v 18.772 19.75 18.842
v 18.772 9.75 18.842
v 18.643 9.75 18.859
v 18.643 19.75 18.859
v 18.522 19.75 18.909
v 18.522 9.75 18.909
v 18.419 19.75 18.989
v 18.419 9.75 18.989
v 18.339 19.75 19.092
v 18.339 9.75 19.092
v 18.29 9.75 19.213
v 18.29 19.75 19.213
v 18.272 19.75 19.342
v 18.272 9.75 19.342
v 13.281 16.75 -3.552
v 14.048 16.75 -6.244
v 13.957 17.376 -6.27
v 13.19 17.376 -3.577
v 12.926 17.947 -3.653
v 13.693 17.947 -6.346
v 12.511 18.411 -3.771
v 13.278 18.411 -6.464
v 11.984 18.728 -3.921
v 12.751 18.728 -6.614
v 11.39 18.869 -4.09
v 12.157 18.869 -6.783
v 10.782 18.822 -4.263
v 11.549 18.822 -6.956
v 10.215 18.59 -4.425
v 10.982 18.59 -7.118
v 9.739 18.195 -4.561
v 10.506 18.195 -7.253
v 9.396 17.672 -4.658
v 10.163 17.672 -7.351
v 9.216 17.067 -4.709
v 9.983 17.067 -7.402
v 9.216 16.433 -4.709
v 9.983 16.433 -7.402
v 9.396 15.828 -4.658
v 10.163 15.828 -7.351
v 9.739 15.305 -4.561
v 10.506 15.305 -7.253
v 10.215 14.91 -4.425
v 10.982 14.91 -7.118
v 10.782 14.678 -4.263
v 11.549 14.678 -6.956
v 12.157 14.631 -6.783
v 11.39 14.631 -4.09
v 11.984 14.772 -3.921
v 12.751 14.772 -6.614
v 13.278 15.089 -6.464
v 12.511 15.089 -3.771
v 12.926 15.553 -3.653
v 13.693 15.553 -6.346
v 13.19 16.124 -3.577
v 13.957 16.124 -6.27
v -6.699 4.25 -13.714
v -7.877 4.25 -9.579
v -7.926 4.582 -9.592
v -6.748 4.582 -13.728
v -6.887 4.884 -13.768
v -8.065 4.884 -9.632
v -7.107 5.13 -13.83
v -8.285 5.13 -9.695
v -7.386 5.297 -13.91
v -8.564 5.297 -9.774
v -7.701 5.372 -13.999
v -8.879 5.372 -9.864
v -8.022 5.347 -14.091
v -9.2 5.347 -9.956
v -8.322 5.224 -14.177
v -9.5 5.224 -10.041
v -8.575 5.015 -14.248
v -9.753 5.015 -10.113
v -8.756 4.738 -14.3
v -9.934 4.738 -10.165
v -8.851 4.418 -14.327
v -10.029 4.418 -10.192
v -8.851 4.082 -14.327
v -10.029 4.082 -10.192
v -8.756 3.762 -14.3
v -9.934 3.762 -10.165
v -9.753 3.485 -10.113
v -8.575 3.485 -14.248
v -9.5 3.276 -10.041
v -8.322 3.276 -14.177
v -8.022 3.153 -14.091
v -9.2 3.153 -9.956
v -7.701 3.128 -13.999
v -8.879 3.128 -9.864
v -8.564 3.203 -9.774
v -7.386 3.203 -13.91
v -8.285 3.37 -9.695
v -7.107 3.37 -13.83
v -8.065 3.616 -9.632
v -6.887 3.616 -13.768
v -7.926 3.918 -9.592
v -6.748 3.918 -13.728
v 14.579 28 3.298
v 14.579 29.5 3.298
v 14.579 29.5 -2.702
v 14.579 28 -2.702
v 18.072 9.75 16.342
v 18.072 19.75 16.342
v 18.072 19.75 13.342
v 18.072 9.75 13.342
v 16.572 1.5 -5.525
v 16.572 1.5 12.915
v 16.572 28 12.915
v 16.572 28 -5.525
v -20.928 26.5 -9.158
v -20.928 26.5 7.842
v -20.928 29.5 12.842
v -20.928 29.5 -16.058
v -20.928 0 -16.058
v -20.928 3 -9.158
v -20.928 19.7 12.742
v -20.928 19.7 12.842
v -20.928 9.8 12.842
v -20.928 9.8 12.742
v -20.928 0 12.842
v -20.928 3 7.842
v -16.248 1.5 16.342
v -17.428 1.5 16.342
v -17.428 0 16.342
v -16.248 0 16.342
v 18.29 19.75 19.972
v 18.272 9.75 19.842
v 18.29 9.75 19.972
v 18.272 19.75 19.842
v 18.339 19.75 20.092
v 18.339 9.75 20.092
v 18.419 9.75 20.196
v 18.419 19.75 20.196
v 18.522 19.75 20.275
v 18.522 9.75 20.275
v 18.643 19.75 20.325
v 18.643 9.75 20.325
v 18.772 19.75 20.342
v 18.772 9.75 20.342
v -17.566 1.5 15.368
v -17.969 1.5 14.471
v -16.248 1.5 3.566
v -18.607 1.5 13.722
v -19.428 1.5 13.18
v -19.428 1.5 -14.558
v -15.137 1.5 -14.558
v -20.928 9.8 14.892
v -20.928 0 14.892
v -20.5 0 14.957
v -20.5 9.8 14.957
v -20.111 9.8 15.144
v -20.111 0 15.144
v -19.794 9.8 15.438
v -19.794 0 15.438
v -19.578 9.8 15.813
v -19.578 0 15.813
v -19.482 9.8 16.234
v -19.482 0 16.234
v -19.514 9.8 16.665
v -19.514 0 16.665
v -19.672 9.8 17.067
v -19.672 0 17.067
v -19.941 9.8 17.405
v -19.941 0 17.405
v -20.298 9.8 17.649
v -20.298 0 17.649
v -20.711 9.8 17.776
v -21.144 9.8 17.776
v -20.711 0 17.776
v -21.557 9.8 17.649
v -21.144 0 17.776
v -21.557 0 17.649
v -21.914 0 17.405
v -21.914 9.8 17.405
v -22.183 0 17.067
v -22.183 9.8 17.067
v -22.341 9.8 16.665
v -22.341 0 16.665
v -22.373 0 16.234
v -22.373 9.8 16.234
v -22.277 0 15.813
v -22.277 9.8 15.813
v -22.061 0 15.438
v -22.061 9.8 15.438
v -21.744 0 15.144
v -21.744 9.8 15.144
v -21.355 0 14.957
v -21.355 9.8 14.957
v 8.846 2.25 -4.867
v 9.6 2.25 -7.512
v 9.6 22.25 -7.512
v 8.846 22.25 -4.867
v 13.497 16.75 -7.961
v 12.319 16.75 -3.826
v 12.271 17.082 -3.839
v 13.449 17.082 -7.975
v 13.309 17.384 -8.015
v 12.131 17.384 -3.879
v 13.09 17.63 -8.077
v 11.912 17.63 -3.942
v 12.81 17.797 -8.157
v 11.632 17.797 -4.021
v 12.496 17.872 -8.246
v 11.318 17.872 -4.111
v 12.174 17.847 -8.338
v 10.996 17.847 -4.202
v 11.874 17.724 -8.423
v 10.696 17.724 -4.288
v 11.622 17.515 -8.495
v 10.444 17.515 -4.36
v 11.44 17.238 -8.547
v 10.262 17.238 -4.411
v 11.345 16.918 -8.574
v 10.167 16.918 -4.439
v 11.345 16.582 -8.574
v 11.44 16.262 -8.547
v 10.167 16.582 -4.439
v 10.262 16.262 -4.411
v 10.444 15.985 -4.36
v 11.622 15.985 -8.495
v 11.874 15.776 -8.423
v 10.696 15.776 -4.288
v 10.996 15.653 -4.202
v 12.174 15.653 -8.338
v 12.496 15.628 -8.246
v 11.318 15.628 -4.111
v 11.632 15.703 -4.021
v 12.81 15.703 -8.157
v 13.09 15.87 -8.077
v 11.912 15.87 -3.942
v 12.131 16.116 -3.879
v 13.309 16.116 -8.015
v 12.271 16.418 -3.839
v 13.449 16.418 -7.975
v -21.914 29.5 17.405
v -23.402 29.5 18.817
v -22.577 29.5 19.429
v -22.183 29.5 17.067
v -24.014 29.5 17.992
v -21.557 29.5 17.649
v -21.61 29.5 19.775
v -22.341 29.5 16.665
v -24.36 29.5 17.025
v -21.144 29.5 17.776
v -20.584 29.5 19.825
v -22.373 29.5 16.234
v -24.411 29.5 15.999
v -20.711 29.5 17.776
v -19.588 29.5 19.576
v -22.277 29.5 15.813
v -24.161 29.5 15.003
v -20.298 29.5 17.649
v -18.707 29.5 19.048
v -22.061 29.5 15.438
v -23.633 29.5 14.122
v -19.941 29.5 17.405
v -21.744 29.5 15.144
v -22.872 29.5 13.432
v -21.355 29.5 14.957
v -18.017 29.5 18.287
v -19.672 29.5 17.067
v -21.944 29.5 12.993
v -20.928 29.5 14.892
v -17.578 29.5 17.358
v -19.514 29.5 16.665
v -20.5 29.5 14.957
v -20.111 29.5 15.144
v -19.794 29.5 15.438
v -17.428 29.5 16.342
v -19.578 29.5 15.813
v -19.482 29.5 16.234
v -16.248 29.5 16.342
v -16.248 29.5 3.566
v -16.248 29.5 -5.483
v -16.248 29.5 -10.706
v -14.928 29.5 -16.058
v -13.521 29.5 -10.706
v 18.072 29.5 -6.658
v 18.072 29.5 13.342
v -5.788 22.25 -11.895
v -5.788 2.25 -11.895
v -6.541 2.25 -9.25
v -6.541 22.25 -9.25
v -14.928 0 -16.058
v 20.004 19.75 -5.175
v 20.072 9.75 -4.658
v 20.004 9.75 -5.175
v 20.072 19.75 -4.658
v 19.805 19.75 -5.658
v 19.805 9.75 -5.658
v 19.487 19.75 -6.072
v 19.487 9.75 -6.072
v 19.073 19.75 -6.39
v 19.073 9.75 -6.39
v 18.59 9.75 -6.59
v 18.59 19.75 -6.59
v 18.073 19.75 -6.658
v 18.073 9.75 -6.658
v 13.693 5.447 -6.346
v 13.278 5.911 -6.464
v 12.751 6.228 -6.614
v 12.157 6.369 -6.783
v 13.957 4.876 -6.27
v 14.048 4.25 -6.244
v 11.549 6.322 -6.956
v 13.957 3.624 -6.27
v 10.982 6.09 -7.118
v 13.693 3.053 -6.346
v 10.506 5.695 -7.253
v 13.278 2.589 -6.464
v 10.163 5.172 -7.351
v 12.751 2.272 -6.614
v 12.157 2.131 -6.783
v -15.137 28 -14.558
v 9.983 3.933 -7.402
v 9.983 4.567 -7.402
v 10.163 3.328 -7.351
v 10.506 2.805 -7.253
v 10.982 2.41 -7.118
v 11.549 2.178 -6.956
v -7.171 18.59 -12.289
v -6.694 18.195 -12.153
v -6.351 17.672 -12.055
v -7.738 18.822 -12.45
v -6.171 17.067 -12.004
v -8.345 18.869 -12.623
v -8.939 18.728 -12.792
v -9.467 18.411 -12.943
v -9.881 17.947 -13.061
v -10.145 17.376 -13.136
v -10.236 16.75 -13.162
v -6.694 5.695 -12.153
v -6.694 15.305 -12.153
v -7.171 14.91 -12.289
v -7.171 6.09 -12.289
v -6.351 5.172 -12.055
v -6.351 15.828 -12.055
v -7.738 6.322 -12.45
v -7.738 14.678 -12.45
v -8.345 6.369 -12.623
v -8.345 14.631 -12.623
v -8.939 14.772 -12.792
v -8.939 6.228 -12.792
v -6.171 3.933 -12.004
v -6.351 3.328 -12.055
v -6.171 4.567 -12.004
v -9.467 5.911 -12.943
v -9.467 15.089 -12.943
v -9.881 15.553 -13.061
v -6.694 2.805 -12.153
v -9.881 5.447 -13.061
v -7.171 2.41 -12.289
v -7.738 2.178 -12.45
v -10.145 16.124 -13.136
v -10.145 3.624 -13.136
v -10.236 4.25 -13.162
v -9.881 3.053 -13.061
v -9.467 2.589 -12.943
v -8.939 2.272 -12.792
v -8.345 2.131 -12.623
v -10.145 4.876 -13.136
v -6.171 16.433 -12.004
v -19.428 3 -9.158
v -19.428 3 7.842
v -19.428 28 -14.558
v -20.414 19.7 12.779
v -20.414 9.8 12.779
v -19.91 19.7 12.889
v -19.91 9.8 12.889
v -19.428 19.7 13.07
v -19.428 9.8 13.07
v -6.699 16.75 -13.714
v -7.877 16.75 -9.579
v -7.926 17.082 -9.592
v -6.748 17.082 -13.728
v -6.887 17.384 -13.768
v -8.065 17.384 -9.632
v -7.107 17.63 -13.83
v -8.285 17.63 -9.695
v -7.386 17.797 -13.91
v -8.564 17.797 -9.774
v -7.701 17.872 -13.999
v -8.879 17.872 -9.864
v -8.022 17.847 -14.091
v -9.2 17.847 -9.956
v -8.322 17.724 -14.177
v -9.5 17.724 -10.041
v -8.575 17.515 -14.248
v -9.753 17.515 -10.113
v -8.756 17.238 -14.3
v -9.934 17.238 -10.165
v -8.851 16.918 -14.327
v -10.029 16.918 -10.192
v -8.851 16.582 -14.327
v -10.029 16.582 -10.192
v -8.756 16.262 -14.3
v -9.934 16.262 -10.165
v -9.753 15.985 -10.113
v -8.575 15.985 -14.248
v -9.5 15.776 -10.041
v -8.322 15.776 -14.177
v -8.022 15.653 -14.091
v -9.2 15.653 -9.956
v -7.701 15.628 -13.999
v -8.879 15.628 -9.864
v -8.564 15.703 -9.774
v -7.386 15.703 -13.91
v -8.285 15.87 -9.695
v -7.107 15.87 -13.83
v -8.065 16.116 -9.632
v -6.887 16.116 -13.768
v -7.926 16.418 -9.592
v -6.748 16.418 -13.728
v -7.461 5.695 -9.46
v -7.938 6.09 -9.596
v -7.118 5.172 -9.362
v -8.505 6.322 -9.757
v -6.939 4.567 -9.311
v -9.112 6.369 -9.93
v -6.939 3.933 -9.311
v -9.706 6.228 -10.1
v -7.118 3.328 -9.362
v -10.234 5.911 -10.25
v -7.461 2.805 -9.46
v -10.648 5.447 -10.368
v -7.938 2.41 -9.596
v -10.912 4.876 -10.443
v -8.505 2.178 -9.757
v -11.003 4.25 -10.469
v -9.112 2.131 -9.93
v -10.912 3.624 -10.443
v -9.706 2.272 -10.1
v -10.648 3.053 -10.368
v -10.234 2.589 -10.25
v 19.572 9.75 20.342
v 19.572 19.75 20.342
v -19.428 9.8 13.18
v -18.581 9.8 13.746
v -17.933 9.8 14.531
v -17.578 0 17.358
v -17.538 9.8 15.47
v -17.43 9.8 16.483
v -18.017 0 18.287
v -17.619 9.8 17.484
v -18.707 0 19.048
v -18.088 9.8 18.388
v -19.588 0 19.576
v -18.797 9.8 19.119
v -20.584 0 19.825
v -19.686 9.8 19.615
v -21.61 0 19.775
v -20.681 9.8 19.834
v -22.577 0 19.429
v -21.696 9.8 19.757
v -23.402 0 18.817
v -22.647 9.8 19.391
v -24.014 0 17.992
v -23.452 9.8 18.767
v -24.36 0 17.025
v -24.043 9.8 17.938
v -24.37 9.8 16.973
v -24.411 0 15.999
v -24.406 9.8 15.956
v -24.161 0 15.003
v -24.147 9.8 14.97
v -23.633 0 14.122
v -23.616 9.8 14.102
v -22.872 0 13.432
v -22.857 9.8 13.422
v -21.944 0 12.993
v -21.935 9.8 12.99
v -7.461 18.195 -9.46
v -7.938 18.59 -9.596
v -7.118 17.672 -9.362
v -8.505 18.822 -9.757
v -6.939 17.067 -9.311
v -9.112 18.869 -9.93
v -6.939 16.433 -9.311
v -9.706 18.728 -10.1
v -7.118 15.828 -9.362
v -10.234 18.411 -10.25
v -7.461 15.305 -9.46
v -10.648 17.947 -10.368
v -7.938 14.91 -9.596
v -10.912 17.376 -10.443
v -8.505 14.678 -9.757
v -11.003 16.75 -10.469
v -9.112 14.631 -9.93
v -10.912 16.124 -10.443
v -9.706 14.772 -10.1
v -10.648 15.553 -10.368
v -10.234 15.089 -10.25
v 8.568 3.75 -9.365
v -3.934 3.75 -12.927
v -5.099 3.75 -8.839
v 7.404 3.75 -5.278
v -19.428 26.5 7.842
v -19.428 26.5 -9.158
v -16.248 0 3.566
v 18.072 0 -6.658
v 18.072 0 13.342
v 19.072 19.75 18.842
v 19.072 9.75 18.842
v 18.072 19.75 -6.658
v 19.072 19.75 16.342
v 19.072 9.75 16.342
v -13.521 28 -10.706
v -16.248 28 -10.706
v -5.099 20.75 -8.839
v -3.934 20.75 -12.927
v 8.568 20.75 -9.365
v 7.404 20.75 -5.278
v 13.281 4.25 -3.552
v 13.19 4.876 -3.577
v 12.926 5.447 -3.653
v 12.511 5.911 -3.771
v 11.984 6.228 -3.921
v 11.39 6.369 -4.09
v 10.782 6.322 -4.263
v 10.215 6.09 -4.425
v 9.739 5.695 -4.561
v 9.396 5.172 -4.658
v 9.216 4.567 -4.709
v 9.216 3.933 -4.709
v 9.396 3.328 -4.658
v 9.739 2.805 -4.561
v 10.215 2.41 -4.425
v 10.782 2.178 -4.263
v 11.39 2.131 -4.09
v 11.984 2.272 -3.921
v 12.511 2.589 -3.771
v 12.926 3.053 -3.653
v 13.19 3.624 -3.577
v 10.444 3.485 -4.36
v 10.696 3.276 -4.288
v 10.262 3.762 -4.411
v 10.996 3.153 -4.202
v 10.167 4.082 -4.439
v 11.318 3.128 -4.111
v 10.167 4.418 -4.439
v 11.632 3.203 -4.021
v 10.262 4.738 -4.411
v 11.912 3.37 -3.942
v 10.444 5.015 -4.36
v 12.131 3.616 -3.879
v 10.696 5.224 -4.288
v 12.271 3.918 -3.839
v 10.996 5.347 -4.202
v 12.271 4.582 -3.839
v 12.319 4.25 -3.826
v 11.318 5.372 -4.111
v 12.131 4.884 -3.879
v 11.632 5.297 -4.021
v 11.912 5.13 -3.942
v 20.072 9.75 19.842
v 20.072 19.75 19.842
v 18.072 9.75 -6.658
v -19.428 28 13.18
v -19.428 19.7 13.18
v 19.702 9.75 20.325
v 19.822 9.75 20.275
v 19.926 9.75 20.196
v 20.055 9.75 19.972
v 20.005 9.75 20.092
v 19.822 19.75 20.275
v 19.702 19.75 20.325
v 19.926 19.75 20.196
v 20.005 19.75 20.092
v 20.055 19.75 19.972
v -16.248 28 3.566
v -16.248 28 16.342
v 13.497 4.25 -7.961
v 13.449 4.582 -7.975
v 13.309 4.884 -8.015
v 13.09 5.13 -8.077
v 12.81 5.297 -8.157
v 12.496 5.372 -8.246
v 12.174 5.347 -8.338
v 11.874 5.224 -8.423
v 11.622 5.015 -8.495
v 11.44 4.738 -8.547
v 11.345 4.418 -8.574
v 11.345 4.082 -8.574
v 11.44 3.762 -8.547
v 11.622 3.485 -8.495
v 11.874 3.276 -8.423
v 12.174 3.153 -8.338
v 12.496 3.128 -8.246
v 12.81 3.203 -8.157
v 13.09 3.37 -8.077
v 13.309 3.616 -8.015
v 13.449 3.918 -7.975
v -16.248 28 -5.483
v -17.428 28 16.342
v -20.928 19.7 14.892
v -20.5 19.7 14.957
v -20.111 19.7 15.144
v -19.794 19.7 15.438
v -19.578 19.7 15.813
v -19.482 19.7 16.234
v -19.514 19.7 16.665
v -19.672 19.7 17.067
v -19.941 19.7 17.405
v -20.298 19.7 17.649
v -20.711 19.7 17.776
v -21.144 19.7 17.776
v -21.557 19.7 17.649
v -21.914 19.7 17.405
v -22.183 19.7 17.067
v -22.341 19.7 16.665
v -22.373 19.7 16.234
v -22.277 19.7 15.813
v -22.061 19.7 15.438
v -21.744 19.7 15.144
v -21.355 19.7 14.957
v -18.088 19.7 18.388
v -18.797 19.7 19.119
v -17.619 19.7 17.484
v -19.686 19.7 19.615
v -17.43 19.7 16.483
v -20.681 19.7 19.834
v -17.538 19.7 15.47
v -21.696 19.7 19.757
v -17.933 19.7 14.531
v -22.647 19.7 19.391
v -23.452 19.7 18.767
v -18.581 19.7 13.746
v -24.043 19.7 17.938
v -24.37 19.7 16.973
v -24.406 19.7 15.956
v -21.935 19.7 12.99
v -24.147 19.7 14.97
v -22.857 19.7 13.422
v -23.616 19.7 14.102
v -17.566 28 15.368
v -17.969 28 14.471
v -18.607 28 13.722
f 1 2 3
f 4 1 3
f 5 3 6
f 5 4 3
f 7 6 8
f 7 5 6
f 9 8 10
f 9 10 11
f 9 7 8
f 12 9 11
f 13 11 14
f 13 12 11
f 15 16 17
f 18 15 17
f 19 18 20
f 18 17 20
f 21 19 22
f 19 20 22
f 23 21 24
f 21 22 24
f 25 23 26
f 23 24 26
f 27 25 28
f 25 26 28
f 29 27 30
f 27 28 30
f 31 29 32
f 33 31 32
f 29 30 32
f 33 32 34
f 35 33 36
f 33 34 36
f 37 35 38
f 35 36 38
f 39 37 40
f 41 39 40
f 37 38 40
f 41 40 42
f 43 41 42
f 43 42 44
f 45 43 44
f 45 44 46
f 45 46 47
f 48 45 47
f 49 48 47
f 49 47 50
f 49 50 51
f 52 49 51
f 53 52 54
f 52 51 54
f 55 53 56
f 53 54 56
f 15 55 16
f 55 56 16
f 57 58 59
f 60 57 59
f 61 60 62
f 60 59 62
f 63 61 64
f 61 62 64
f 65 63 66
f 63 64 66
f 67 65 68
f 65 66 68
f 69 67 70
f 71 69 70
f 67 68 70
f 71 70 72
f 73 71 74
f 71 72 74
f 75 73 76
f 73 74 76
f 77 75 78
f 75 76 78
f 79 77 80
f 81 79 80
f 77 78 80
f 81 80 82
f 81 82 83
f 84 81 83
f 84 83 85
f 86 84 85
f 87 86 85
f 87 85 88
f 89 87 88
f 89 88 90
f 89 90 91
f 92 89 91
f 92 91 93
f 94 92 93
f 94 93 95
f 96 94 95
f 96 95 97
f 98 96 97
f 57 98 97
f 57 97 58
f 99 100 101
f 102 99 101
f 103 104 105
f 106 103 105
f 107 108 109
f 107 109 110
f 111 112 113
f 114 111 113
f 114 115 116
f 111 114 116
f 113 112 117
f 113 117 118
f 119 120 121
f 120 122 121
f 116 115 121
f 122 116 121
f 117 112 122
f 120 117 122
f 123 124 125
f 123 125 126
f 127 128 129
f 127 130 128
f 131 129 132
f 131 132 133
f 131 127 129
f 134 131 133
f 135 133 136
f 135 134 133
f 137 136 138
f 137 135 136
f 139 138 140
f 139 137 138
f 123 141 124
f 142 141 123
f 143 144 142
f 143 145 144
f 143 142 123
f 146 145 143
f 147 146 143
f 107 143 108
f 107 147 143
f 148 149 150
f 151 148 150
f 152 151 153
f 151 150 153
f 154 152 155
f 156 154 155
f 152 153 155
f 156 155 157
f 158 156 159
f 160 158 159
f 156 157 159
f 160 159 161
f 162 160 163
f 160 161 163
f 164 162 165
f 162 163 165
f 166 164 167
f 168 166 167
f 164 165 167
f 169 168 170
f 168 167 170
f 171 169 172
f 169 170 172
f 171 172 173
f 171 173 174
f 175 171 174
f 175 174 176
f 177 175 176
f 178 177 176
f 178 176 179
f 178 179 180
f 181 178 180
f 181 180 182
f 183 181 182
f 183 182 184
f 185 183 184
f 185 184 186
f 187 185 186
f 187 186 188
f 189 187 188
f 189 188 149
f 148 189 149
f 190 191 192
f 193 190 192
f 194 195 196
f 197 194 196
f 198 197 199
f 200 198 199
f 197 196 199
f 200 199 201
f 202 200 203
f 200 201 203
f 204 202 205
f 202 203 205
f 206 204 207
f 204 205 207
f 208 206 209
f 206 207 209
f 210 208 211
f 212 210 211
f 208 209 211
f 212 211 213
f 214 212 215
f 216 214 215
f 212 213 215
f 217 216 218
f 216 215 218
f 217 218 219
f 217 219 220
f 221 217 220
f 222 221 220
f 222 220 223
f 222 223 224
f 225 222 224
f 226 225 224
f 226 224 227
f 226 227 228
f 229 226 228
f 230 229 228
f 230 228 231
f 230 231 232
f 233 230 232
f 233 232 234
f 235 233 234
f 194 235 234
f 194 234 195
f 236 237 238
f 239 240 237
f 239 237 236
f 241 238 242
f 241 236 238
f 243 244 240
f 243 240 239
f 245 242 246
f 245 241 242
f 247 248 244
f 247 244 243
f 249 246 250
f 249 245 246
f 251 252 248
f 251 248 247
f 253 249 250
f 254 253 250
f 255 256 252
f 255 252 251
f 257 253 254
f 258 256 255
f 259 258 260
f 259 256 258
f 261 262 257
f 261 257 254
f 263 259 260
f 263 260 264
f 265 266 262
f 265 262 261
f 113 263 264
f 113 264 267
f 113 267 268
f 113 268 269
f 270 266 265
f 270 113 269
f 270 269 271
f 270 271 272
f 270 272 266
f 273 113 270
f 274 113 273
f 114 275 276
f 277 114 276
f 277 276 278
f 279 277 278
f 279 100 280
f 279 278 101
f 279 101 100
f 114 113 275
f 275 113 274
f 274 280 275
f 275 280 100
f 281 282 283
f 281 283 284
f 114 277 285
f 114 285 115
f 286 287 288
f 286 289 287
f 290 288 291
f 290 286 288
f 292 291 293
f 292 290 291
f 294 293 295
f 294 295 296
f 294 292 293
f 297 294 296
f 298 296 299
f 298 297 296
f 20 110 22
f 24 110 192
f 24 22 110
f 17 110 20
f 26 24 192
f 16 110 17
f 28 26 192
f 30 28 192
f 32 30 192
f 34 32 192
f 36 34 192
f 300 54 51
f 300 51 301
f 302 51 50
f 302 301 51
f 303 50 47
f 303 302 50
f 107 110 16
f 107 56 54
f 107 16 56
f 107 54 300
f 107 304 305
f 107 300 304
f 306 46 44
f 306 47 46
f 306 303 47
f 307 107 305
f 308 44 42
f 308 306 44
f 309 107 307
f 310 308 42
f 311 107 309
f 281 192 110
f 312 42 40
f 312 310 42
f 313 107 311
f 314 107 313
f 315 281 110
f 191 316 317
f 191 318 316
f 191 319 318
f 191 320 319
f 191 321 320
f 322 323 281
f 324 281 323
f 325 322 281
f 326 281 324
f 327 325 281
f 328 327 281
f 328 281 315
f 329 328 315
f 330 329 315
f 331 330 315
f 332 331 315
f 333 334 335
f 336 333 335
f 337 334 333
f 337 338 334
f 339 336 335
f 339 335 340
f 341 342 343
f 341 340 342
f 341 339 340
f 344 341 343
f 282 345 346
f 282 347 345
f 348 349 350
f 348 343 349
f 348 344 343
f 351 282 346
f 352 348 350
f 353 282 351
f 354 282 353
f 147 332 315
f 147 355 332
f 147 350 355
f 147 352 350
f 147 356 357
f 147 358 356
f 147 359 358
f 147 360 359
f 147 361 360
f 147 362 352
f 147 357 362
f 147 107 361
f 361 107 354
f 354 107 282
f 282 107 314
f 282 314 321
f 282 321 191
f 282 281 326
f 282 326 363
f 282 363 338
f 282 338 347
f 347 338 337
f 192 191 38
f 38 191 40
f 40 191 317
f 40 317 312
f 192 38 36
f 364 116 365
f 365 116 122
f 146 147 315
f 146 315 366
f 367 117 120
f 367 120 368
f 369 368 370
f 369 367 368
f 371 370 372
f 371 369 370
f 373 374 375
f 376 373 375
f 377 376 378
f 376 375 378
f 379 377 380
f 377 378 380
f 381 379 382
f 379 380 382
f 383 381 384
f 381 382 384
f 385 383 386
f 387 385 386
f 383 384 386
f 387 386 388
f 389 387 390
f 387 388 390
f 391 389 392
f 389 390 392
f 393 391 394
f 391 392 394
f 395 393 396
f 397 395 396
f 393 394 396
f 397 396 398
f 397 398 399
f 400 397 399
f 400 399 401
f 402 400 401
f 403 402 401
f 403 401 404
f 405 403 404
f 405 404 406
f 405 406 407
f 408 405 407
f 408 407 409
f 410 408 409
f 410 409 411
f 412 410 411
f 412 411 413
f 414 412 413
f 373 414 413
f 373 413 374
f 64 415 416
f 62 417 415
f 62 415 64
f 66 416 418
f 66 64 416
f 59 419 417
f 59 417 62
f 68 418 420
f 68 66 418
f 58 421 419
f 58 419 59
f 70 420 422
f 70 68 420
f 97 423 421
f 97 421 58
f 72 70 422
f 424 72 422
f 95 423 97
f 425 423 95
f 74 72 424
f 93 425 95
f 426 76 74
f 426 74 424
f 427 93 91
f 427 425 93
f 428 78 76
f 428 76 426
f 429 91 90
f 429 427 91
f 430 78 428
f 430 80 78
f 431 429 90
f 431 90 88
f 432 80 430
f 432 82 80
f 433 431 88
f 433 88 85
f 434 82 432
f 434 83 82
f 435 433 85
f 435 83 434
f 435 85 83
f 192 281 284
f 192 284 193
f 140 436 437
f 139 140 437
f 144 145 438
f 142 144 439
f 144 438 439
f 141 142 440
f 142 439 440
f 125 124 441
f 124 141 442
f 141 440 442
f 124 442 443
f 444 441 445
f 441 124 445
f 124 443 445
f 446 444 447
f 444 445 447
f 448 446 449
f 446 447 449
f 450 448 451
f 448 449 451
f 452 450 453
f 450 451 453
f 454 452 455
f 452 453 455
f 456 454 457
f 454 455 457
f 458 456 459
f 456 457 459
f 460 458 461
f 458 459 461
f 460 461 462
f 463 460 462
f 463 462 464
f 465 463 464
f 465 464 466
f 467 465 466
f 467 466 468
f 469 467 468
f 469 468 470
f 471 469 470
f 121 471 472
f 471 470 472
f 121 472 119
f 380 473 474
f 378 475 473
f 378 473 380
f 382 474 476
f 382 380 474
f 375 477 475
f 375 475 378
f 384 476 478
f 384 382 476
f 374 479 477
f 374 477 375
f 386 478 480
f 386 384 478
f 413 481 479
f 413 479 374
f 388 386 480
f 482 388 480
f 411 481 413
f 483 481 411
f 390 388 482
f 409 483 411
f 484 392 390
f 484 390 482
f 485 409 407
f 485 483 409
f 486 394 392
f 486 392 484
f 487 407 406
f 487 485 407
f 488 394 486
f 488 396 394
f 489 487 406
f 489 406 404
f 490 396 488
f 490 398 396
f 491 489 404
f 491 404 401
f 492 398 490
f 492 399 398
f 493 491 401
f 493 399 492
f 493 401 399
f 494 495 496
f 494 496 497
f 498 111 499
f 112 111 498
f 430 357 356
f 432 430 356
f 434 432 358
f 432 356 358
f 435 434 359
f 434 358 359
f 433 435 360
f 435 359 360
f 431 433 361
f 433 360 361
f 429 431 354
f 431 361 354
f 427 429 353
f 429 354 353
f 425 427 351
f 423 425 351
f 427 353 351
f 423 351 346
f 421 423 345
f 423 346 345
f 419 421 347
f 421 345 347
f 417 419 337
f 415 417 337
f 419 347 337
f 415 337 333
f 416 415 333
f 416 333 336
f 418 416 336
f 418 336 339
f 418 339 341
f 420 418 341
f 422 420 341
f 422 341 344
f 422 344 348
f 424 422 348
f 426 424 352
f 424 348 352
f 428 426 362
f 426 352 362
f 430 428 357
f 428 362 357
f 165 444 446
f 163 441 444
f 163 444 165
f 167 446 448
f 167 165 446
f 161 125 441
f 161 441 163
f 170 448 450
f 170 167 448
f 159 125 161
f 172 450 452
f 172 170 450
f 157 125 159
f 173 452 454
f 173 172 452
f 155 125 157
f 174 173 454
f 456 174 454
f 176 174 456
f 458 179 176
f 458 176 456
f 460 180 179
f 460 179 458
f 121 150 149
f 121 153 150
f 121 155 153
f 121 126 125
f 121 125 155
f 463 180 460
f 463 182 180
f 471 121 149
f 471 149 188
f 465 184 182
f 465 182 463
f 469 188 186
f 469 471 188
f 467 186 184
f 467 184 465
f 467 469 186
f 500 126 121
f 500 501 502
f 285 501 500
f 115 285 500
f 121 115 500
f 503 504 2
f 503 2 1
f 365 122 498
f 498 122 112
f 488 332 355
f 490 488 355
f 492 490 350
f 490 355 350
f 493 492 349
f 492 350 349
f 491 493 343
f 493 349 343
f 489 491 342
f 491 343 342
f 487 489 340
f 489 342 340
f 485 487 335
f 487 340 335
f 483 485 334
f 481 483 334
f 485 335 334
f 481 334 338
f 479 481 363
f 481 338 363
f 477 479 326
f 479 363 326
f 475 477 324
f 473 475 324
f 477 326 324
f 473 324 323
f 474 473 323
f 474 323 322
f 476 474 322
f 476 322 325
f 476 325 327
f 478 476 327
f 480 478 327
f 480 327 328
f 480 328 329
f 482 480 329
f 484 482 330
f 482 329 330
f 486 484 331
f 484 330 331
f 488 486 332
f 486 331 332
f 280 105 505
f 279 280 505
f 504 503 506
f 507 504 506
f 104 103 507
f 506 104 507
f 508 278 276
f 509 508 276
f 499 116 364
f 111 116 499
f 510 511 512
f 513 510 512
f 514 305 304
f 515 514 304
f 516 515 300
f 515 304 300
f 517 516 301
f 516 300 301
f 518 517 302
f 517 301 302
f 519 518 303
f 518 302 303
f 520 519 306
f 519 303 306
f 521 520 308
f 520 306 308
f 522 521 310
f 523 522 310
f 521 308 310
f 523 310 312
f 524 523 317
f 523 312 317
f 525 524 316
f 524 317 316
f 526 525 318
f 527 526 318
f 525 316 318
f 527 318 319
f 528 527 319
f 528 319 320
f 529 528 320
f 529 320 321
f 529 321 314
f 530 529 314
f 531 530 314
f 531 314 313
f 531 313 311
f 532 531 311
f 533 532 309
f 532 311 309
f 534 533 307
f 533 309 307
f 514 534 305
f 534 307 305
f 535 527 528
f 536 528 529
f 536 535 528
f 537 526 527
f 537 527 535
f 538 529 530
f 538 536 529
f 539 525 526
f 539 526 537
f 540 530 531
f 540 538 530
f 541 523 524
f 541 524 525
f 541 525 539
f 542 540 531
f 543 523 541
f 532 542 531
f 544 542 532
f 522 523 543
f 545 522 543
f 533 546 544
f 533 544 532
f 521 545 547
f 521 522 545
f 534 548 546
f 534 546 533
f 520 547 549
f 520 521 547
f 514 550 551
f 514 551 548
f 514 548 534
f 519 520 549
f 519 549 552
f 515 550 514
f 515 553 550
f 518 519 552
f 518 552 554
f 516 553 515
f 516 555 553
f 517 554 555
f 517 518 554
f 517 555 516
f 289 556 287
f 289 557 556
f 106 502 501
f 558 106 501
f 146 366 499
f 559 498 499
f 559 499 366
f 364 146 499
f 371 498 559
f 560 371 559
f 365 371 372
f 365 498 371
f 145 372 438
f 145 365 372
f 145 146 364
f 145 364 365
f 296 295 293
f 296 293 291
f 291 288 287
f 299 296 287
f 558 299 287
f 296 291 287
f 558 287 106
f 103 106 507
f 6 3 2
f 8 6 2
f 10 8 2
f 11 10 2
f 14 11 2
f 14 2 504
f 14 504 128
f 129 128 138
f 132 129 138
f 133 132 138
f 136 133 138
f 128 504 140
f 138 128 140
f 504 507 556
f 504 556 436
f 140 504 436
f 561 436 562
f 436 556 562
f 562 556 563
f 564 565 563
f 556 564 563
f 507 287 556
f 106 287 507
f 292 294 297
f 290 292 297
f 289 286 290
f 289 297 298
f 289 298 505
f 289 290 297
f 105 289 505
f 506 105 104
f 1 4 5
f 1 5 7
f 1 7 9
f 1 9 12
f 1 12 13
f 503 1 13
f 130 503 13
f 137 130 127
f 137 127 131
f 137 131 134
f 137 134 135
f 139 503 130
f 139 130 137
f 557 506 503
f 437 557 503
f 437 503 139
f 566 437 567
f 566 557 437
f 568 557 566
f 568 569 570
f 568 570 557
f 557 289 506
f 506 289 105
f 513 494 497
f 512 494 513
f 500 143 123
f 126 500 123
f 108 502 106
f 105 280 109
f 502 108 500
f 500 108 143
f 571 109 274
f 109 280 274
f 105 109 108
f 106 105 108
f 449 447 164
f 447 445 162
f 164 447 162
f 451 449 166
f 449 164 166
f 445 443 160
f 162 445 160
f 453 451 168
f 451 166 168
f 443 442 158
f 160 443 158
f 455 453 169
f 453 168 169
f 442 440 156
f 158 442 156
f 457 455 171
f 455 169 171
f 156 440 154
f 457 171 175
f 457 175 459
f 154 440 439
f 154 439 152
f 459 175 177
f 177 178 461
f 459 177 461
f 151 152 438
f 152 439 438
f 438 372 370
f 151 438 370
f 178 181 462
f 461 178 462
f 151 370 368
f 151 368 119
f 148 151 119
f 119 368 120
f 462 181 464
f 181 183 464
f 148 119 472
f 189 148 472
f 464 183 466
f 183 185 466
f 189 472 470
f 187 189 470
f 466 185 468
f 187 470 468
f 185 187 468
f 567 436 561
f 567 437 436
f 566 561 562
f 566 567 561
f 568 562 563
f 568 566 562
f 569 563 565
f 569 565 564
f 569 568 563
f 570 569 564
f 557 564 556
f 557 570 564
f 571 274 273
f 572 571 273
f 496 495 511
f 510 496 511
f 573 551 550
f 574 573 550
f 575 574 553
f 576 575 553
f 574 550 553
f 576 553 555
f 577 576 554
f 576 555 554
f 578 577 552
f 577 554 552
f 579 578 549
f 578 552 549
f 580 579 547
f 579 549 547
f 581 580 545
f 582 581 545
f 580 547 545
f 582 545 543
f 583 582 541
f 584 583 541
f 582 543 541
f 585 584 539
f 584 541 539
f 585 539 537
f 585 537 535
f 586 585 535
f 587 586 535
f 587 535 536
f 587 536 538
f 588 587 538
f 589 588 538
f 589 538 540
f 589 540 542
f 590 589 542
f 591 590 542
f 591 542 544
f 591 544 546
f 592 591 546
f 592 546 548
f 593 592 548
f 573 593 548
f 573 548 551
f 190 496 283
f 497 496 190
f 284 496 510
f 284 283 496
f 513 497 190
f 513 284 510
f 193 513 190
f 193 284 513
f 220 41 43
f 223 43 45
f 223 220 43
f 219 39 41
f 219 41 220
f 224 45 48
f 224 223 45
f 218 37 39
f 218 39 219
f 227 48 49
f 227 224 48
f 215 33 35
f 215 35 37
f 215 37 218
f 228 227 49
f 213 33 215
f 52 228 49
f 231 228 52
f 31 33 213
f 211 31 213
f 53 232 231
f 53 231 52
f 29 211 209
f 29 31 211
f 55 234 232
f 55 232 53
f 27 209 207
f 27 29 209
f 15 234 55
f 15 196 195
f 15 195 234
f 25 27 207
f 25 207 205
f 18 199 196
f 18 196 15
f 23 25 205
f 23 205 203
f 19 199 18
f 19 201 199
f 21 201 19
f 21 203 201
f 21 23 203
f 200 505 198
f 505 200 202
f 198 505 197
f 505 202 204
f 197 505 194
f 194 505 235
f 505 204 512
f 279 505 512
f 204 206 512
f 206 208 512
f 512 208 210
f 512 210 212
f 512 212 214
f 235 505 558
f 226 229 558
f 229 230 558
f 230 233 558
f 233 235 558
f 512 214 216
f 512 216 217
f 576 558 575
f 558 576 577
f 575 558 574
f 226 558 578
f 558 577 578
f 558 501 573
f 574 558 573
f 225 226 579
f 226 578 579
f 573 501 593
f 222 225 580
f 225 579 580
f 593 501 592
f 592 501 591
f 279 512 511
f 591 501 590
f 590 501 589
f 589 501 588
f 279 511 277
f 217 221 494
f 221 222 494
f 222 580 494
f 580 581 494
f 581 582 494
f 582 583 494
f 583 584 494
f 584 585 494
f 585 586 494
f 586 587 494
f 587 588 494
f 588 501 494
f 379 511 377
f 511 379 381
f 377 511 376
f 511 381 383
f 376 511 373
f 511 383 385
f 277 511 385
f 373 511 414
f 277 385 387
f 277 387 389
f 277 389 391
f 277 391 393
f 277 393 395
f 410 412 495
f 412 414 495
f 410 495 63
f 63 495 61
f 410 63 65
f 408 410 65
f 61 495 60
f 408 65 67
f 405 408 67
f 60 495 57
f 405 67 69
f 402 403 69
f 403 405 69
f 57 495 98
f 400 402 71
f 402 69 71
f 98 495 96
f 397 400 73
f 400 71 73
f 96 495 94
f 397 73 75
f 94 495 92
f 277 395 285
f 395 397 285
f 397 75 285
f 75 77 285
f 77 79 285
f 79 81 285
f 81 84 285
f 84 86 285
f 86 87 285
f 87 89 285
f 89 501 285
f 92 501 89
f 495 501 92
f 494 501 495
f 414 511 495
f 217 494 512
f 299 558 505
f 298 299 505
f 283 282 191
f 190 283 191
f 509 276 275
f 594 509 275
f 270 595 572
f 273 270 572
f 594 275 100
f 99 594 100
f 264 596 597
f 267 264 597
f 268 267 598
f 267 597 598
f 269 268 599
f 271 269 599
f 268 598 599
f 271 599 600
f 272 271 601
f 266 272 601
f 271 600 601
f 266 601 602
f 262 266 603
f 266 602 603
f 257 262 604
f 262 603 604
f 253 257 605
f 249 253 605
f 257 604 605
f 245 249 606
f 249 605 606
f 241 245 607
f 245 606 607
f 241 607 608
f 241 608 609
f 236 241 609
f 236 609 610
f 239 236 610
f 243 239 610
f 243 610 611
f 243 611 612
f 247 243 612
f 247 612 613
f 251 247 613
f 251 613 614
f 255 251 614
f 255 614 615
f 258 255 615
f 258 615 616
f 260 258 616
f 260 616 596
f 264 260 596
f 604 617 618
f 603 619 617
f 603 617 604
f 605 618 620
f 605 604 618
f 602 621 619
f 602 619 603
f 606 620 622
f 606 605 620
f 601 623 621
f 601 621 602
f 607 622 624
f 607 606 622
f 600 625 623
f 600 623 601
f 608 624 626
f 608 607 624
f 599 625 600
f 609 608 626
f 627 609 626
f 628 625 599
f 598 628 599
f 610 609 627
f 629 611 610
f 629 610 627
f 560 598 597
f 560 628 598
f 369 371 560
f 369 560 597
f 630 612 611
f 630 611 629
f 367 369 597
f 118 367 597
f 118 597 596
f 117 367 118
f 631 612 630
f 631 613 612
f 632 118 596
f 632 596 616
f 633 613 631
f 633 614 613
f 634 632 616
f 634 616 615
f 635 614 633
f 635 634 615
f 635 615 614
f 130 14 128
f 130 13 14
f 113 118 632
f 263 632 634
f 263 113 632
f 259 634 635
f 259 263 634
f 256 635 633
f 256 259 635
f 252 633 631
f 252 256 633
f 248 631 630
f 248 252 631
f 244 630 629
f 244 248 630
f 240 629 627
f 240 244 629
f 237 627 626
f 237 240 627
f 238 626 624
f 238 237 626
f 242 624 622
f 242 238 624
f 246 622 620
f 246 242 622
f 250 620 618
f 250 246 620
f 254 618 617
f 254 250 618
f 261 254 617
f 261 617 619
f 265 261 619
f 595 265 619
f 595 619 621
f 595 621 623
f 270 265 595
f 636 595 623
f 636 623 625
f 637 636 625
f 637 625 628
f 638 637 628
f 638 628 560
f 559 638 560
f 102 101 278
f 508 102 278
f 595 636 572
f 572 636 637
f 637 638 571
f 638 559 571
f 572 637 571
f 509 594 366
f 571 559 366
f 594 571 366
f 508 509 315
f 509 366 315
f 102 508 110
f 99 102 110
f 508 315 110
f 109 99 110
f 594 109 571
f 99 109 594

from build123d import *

# Parameters (mm, degrees)
BOSS_EXTRUDE1_DEPTH     = 29.5
SHELL1_T                = -1.5
SKETCH11_W              = 16
SKETCH11_H              = 20
BOSS_EXTRUDE6_DEPTH     = 2.75
CUT_EXTRUDE1_DEPTH      = 46.77263185
CUT_EXTRUDE1_DEPTH_BACK = 46.77263185
SKETCH3_W               = 13
SKETCH3_H               = 17
SKETCH4_R               = 2.125
BOSS_EXTRUDE2_DEPTH     = 2.8
SKETCH5_R               = 1.125
CUT_EXTRUDE2_DEPTH      = 44.905225798
SKETCH6_R               = 3.5
BOSS_EXTRUDE3_DEPTH     = 9.8
BOSS_EXTRUDE4_START     = -9.8
SKETCH7_R               = 3.5
BOSS_EXTRUDE4_DEPTH     = 9.8
SKETCH8_R               = 3.6
CUT_EXTRUDE3_DEPTH      = 9.9
SKETCH9_R               = 1.45
CUT_EXTRUDE4_DEPTH      = 44.135478309
SKETCH12_W              = 23
SKETCH12_H              = 10
BOSS_EXTRUDE7_DEPTH     = 1
SKETCH13_W              = 27
SKETCH13_H              = 10
BOSS_EXTRUDE8_DEPTH     = 1
SKETCH14_W              = 1.5
SKETCH14_H              = 10
BOSS_EXTRUDE9_DEPTH     = 0.8
FILLET2_R               = 0.5
FILLET3_R               = 0.5
FILLET4_R               = 2
CUT_EXTRUDE5_DEPTH      = 44.367750194
CUT_EXTRUDE6_REACH      = 56.452
SKETCH16_W              = 17
SKETCH16_H              = 23.5
CUT_EXTRUDE7_DEPTH      = 1.5


with BuildPart() as part:
    # Sketch2 → Boss-Extrude1 (new body)
    with BuildSketch(Plane(origin=(0, 0, 0), x_dir=(1, 0, 0), z_dir=(0, 1, 0))):
        Polygon((18.072476765, -16.342267954), (18.072476765, 6.657732046), (-14.927523235, 16.058029327), (-20.927523235, 16.058029327), (-20.927523235, -16.342267954), align=None)
    extrude(amount=BOSS_EXTRUDE1_DEPTH)

    # Shell1
    shell1_openings = [part.faces().sort_by_distance(p)[0] for p in [
        (-1.427523235, 14.75, 16.342267954),
    ]]
    offset(amount=SHELL1_T, openings=shell1_openings, kind=Kind.INTERSECTION)

    # Sketch11 → Boss-Extrude6 (add)
    with BuildSketch(Plane(origin=(2.699631824, 0, -9.477131153), x_dir=(0.9617413095492132, 0, 0.2739592186924259), z_dir=(-0.2739592186924259, 0, 0.9617413095492132))):
        with Locations((-0.825284328, 12.25)):
            Rectangle(SKETCH11_W, SKETCH11_H)
    extrude(amount=BOSS_EXTRUDE6_DEPTH)

    # Sketch3 → Cut-Extrude1 (cut, two sides: drawn at the far end of the back side and taken through both)
    with BuildSketch(Plane(origin=(2.699631824, 0, -9.477131153), x_dir=(0.9617413095492132, 0, 0.2739592186924259), z_dir=(-0.2739592186924259, 0, 0.9617413095492132)).offset(-CUT_EXTRUDE1_DEPTH_BACK)):
        with Locations((-0.825284328, 12.25)):
            Rectangle(SKETCH3_W, SKETCH3_H)
    extrude(amount=CUT_EXTRUDE1_DEPTH + CUT_EXTRUDE1_DEPTH_BACK, mode=Mode.SUBTRACT)

    # Sketch4 → Boss-Extrude2 (add)
    with BuildSketch(Plane(origin=(2.699631824, 0, -9.477131153), x_dir=(0.9617413095492132, 0, 0.2739592186924259), z_dir=(-0.2739592186924259, 0, 0.9617413095492132))):
        with Locations((9.674715672, 4.25)):
            Circle(SKETCH4_R)
        with Locations((9.674715672, 16.75)):
            Circle(SKETCH4_R)
        with Locations(Location((-11.325284328, 16.75, 0), (0, 0, 180))):
            Circle(SKETCH4_R)
        with Locations(Location((-11.325284328, 4.25, 0), (0, 0, 180))):
            Circle(SKETCH4_R)
    extrude(amount=BOSS_EXTRUDE2_DEPTH)

    # Sketch5 → Cut-Extrude2 (cut, through all)
    with BuildSketch(Plane(origin=(1.932546012, 0, -6.784255486), x_dir=(0.9617413095492132, 0, 0.2739592186924259), z_dir=(-0.2739592186924259, 0, 0.9617413095492132))):
        with Locations((9.674715672, 4.25)):
            Circle(SKETCH5_R)
        with Locations((9.674715672, 16.75)):
            Circle(SKETCH5_R)
        with Locations((-11.325284328, 4.25)):
            Circle(SKETCH5_R)
        with Locations((-11.325284328, 16.75)):
            Circle(SKETCH5_R)
    extrude(amount=-CUT_EXTRUDE2_DEPTH, mode=Mode.SUBTRACT)

    # Sketch6 → Boss-Extrude3 (add)
    with BuildSketch(Plane(origin=(0, 29.5, 0), x_dir=(1, 0, 0), z_dir=(0, 1, 0))):
        with Locations((-20.927523235, -16.342267954)):
            Circle(SKETCH6_R)
    extrude(amount=-BOSS_EXTRUDE3_DEPTH)

    # Sketch7 → Boss-Extrude4 (add)
    with BuildSketch(Plane(origin=(0, 0, 0), x_dir=(-1, 0, 0), z_dir=(0, -1, 0)).offset(BOSS_EXTRUDE4_START)):
        with Locations((20.927523235, -16.342267954)):
            Circle(SKETCH7_R)
    extrude(amount=BOSS_EXTRUDE4_DEPTH)

    # Sketch8 → Cut-Extrude3 (cut)
    with BuildSketch(Plane(origin=(0, 19.7, 0), x_dir=(-1, 0, 0), z_dir=(0, -1, 0))):
        with Locations((20.927523235, -16.342267954)):
            Circle(SKETCH8_R)
    extrude(amount=CUT_EXTRUDE3_DEPTH, mode=Mode.SUBTRACT)

    # Sketch9 → Cut-Extrude4 (cut, through all)
    with BuildSketch(Plane(origin=(0, 0, 0), x_dir=(-1, 0, 0), z_dir=(0, -1, 0))):
        with Locations(Location((20.927523235, -16.342267954, 0), (0, 0, 90))):
            Circle(SKETCH9_R)
    extrude(amount=-CUT_EXTRUDE4_DEPTH, mode=Mode.SUBTRACT)

    # Sketch12 → Boss-Extrude7 (add)
    with BuildSketch(Plane(origin=(18.072476765, 0, 0), x_dir=(0, 0, -1), z_dir=(1, 0, 0))):
        with Locations((-4.842267954, 14.75)):
            Rectangle(SKETCH12_W, SKETCH12_H)
    extrude(amount=BOSS_EXTRUDE7_DEPTH)

    # Sketch13 → Boss-Extrude8 (add)
    with BuildSketch(Plane(origin=(19.072476765, 0, 0), x_dir=(0, 0, -1), z_dir=(1, 0, 0))):
        with Locations((-6.842267954, 14.75)):
            Rectangle(SKETCH13_W, SKETCH13_H)
    extrude(amount=BOSS_EXTRUDE8_DEPTH)

    # Sketch14 → Boss-Extrude9 (add)
    with BuildSketch(Plane.ZY.offset(-19.072476765)):
        with Locations((19.592267954, 14.75)):
            Rectangle(SKETCH14_W, SKETCH14_H)
    extrude(amount=BOSS_EXTRUDE9_DEPTH)

    # Fillet2
    fillet2_edges = [part.edges().sort_by_distance(p)[0] for p in [
        (20.072476765, 14.75, 20.342267954),
        (18.272476765, 14.75, 18.842267954),
    ]]
    fillet(fillet2_edges, radius=FILLET2_R)

    # Fillet3
    fillet3_edges = [part.edges().sort_by_distance(p)[0] for p in [
        (18.272476765, 14.75, 20.342267954),
    ]]
    fillet(fillet3_edges, radius=FILLET3_R)

    # Fillet4
    fillet4_edges = [part.edges().sort_by_distance(p)[0] for p in [
        (20.072476765, 14.75, -6.657732046),
    ]]
    fillet(fillet4_edges, radius=FILLET4_R - 0.0001)  # a hair under: the kernel refuses the full size

    # Sketch15 → Cut-Extrude5 (cut, through all)
    with BuildSketch(Plane(origin=(0, 29.5, 0), x_dir=(1, 0, 0), z_dir=(0, 1, 0))):
        Polygon((18.072476765, -13.342267954), (-16.247523235, -3.565958782), (-16.247523235, -6.478203224), (-16.247523235, -16.342267954), (18.072476765, -16.342267954), align=None)
    extrude(amount=-CUT_EXTRUDE5_DEPTH, mode=Mode.SUBTRACT)

    # Sketch16 → Cut-Extrude6 (cut, up to next)
    with BuildSketch(Plane.ZY.offset(20.927523235), mode=Mode.PRIVATE) as cut_extrude6_sk1:
        with Locations((-0.657732046, 14.75)):
            Rectangle(SKETCH16_W, SKETCH16_H)
    cut_extrude6_tool1 = extrude(cut_extrude6_sk1.sketch, amount=-CUT_EXTRUDE6_REACH, mode=Mode.PRIVATE) & part.part
    add(cut_extrude6_tool1.solids().sort_by_distance((-20.927523, 14.75, -0.657732))[0], mode=Mode.SUBTRACT)

    # Sketch17 → Cut-Extrude7 (cut)
    with BuildSketch(Plane(origin=(0, 29.5, 0), x_dir=(1, 0, 0), z_dir=(0, 1, 0))):
        Polygon((-16.247523235, 5.483028504), (14.579138142, -3.298176984), (14.579138142, 2.701823016), (-13.521396163, 10.70647078), (-16.247523235, 10.70647078), align=None)
    extrude(amount=-CUT_EXTRUDE7_DEPTH, mode=Mode.SUBTRACT)


solid = part.part
